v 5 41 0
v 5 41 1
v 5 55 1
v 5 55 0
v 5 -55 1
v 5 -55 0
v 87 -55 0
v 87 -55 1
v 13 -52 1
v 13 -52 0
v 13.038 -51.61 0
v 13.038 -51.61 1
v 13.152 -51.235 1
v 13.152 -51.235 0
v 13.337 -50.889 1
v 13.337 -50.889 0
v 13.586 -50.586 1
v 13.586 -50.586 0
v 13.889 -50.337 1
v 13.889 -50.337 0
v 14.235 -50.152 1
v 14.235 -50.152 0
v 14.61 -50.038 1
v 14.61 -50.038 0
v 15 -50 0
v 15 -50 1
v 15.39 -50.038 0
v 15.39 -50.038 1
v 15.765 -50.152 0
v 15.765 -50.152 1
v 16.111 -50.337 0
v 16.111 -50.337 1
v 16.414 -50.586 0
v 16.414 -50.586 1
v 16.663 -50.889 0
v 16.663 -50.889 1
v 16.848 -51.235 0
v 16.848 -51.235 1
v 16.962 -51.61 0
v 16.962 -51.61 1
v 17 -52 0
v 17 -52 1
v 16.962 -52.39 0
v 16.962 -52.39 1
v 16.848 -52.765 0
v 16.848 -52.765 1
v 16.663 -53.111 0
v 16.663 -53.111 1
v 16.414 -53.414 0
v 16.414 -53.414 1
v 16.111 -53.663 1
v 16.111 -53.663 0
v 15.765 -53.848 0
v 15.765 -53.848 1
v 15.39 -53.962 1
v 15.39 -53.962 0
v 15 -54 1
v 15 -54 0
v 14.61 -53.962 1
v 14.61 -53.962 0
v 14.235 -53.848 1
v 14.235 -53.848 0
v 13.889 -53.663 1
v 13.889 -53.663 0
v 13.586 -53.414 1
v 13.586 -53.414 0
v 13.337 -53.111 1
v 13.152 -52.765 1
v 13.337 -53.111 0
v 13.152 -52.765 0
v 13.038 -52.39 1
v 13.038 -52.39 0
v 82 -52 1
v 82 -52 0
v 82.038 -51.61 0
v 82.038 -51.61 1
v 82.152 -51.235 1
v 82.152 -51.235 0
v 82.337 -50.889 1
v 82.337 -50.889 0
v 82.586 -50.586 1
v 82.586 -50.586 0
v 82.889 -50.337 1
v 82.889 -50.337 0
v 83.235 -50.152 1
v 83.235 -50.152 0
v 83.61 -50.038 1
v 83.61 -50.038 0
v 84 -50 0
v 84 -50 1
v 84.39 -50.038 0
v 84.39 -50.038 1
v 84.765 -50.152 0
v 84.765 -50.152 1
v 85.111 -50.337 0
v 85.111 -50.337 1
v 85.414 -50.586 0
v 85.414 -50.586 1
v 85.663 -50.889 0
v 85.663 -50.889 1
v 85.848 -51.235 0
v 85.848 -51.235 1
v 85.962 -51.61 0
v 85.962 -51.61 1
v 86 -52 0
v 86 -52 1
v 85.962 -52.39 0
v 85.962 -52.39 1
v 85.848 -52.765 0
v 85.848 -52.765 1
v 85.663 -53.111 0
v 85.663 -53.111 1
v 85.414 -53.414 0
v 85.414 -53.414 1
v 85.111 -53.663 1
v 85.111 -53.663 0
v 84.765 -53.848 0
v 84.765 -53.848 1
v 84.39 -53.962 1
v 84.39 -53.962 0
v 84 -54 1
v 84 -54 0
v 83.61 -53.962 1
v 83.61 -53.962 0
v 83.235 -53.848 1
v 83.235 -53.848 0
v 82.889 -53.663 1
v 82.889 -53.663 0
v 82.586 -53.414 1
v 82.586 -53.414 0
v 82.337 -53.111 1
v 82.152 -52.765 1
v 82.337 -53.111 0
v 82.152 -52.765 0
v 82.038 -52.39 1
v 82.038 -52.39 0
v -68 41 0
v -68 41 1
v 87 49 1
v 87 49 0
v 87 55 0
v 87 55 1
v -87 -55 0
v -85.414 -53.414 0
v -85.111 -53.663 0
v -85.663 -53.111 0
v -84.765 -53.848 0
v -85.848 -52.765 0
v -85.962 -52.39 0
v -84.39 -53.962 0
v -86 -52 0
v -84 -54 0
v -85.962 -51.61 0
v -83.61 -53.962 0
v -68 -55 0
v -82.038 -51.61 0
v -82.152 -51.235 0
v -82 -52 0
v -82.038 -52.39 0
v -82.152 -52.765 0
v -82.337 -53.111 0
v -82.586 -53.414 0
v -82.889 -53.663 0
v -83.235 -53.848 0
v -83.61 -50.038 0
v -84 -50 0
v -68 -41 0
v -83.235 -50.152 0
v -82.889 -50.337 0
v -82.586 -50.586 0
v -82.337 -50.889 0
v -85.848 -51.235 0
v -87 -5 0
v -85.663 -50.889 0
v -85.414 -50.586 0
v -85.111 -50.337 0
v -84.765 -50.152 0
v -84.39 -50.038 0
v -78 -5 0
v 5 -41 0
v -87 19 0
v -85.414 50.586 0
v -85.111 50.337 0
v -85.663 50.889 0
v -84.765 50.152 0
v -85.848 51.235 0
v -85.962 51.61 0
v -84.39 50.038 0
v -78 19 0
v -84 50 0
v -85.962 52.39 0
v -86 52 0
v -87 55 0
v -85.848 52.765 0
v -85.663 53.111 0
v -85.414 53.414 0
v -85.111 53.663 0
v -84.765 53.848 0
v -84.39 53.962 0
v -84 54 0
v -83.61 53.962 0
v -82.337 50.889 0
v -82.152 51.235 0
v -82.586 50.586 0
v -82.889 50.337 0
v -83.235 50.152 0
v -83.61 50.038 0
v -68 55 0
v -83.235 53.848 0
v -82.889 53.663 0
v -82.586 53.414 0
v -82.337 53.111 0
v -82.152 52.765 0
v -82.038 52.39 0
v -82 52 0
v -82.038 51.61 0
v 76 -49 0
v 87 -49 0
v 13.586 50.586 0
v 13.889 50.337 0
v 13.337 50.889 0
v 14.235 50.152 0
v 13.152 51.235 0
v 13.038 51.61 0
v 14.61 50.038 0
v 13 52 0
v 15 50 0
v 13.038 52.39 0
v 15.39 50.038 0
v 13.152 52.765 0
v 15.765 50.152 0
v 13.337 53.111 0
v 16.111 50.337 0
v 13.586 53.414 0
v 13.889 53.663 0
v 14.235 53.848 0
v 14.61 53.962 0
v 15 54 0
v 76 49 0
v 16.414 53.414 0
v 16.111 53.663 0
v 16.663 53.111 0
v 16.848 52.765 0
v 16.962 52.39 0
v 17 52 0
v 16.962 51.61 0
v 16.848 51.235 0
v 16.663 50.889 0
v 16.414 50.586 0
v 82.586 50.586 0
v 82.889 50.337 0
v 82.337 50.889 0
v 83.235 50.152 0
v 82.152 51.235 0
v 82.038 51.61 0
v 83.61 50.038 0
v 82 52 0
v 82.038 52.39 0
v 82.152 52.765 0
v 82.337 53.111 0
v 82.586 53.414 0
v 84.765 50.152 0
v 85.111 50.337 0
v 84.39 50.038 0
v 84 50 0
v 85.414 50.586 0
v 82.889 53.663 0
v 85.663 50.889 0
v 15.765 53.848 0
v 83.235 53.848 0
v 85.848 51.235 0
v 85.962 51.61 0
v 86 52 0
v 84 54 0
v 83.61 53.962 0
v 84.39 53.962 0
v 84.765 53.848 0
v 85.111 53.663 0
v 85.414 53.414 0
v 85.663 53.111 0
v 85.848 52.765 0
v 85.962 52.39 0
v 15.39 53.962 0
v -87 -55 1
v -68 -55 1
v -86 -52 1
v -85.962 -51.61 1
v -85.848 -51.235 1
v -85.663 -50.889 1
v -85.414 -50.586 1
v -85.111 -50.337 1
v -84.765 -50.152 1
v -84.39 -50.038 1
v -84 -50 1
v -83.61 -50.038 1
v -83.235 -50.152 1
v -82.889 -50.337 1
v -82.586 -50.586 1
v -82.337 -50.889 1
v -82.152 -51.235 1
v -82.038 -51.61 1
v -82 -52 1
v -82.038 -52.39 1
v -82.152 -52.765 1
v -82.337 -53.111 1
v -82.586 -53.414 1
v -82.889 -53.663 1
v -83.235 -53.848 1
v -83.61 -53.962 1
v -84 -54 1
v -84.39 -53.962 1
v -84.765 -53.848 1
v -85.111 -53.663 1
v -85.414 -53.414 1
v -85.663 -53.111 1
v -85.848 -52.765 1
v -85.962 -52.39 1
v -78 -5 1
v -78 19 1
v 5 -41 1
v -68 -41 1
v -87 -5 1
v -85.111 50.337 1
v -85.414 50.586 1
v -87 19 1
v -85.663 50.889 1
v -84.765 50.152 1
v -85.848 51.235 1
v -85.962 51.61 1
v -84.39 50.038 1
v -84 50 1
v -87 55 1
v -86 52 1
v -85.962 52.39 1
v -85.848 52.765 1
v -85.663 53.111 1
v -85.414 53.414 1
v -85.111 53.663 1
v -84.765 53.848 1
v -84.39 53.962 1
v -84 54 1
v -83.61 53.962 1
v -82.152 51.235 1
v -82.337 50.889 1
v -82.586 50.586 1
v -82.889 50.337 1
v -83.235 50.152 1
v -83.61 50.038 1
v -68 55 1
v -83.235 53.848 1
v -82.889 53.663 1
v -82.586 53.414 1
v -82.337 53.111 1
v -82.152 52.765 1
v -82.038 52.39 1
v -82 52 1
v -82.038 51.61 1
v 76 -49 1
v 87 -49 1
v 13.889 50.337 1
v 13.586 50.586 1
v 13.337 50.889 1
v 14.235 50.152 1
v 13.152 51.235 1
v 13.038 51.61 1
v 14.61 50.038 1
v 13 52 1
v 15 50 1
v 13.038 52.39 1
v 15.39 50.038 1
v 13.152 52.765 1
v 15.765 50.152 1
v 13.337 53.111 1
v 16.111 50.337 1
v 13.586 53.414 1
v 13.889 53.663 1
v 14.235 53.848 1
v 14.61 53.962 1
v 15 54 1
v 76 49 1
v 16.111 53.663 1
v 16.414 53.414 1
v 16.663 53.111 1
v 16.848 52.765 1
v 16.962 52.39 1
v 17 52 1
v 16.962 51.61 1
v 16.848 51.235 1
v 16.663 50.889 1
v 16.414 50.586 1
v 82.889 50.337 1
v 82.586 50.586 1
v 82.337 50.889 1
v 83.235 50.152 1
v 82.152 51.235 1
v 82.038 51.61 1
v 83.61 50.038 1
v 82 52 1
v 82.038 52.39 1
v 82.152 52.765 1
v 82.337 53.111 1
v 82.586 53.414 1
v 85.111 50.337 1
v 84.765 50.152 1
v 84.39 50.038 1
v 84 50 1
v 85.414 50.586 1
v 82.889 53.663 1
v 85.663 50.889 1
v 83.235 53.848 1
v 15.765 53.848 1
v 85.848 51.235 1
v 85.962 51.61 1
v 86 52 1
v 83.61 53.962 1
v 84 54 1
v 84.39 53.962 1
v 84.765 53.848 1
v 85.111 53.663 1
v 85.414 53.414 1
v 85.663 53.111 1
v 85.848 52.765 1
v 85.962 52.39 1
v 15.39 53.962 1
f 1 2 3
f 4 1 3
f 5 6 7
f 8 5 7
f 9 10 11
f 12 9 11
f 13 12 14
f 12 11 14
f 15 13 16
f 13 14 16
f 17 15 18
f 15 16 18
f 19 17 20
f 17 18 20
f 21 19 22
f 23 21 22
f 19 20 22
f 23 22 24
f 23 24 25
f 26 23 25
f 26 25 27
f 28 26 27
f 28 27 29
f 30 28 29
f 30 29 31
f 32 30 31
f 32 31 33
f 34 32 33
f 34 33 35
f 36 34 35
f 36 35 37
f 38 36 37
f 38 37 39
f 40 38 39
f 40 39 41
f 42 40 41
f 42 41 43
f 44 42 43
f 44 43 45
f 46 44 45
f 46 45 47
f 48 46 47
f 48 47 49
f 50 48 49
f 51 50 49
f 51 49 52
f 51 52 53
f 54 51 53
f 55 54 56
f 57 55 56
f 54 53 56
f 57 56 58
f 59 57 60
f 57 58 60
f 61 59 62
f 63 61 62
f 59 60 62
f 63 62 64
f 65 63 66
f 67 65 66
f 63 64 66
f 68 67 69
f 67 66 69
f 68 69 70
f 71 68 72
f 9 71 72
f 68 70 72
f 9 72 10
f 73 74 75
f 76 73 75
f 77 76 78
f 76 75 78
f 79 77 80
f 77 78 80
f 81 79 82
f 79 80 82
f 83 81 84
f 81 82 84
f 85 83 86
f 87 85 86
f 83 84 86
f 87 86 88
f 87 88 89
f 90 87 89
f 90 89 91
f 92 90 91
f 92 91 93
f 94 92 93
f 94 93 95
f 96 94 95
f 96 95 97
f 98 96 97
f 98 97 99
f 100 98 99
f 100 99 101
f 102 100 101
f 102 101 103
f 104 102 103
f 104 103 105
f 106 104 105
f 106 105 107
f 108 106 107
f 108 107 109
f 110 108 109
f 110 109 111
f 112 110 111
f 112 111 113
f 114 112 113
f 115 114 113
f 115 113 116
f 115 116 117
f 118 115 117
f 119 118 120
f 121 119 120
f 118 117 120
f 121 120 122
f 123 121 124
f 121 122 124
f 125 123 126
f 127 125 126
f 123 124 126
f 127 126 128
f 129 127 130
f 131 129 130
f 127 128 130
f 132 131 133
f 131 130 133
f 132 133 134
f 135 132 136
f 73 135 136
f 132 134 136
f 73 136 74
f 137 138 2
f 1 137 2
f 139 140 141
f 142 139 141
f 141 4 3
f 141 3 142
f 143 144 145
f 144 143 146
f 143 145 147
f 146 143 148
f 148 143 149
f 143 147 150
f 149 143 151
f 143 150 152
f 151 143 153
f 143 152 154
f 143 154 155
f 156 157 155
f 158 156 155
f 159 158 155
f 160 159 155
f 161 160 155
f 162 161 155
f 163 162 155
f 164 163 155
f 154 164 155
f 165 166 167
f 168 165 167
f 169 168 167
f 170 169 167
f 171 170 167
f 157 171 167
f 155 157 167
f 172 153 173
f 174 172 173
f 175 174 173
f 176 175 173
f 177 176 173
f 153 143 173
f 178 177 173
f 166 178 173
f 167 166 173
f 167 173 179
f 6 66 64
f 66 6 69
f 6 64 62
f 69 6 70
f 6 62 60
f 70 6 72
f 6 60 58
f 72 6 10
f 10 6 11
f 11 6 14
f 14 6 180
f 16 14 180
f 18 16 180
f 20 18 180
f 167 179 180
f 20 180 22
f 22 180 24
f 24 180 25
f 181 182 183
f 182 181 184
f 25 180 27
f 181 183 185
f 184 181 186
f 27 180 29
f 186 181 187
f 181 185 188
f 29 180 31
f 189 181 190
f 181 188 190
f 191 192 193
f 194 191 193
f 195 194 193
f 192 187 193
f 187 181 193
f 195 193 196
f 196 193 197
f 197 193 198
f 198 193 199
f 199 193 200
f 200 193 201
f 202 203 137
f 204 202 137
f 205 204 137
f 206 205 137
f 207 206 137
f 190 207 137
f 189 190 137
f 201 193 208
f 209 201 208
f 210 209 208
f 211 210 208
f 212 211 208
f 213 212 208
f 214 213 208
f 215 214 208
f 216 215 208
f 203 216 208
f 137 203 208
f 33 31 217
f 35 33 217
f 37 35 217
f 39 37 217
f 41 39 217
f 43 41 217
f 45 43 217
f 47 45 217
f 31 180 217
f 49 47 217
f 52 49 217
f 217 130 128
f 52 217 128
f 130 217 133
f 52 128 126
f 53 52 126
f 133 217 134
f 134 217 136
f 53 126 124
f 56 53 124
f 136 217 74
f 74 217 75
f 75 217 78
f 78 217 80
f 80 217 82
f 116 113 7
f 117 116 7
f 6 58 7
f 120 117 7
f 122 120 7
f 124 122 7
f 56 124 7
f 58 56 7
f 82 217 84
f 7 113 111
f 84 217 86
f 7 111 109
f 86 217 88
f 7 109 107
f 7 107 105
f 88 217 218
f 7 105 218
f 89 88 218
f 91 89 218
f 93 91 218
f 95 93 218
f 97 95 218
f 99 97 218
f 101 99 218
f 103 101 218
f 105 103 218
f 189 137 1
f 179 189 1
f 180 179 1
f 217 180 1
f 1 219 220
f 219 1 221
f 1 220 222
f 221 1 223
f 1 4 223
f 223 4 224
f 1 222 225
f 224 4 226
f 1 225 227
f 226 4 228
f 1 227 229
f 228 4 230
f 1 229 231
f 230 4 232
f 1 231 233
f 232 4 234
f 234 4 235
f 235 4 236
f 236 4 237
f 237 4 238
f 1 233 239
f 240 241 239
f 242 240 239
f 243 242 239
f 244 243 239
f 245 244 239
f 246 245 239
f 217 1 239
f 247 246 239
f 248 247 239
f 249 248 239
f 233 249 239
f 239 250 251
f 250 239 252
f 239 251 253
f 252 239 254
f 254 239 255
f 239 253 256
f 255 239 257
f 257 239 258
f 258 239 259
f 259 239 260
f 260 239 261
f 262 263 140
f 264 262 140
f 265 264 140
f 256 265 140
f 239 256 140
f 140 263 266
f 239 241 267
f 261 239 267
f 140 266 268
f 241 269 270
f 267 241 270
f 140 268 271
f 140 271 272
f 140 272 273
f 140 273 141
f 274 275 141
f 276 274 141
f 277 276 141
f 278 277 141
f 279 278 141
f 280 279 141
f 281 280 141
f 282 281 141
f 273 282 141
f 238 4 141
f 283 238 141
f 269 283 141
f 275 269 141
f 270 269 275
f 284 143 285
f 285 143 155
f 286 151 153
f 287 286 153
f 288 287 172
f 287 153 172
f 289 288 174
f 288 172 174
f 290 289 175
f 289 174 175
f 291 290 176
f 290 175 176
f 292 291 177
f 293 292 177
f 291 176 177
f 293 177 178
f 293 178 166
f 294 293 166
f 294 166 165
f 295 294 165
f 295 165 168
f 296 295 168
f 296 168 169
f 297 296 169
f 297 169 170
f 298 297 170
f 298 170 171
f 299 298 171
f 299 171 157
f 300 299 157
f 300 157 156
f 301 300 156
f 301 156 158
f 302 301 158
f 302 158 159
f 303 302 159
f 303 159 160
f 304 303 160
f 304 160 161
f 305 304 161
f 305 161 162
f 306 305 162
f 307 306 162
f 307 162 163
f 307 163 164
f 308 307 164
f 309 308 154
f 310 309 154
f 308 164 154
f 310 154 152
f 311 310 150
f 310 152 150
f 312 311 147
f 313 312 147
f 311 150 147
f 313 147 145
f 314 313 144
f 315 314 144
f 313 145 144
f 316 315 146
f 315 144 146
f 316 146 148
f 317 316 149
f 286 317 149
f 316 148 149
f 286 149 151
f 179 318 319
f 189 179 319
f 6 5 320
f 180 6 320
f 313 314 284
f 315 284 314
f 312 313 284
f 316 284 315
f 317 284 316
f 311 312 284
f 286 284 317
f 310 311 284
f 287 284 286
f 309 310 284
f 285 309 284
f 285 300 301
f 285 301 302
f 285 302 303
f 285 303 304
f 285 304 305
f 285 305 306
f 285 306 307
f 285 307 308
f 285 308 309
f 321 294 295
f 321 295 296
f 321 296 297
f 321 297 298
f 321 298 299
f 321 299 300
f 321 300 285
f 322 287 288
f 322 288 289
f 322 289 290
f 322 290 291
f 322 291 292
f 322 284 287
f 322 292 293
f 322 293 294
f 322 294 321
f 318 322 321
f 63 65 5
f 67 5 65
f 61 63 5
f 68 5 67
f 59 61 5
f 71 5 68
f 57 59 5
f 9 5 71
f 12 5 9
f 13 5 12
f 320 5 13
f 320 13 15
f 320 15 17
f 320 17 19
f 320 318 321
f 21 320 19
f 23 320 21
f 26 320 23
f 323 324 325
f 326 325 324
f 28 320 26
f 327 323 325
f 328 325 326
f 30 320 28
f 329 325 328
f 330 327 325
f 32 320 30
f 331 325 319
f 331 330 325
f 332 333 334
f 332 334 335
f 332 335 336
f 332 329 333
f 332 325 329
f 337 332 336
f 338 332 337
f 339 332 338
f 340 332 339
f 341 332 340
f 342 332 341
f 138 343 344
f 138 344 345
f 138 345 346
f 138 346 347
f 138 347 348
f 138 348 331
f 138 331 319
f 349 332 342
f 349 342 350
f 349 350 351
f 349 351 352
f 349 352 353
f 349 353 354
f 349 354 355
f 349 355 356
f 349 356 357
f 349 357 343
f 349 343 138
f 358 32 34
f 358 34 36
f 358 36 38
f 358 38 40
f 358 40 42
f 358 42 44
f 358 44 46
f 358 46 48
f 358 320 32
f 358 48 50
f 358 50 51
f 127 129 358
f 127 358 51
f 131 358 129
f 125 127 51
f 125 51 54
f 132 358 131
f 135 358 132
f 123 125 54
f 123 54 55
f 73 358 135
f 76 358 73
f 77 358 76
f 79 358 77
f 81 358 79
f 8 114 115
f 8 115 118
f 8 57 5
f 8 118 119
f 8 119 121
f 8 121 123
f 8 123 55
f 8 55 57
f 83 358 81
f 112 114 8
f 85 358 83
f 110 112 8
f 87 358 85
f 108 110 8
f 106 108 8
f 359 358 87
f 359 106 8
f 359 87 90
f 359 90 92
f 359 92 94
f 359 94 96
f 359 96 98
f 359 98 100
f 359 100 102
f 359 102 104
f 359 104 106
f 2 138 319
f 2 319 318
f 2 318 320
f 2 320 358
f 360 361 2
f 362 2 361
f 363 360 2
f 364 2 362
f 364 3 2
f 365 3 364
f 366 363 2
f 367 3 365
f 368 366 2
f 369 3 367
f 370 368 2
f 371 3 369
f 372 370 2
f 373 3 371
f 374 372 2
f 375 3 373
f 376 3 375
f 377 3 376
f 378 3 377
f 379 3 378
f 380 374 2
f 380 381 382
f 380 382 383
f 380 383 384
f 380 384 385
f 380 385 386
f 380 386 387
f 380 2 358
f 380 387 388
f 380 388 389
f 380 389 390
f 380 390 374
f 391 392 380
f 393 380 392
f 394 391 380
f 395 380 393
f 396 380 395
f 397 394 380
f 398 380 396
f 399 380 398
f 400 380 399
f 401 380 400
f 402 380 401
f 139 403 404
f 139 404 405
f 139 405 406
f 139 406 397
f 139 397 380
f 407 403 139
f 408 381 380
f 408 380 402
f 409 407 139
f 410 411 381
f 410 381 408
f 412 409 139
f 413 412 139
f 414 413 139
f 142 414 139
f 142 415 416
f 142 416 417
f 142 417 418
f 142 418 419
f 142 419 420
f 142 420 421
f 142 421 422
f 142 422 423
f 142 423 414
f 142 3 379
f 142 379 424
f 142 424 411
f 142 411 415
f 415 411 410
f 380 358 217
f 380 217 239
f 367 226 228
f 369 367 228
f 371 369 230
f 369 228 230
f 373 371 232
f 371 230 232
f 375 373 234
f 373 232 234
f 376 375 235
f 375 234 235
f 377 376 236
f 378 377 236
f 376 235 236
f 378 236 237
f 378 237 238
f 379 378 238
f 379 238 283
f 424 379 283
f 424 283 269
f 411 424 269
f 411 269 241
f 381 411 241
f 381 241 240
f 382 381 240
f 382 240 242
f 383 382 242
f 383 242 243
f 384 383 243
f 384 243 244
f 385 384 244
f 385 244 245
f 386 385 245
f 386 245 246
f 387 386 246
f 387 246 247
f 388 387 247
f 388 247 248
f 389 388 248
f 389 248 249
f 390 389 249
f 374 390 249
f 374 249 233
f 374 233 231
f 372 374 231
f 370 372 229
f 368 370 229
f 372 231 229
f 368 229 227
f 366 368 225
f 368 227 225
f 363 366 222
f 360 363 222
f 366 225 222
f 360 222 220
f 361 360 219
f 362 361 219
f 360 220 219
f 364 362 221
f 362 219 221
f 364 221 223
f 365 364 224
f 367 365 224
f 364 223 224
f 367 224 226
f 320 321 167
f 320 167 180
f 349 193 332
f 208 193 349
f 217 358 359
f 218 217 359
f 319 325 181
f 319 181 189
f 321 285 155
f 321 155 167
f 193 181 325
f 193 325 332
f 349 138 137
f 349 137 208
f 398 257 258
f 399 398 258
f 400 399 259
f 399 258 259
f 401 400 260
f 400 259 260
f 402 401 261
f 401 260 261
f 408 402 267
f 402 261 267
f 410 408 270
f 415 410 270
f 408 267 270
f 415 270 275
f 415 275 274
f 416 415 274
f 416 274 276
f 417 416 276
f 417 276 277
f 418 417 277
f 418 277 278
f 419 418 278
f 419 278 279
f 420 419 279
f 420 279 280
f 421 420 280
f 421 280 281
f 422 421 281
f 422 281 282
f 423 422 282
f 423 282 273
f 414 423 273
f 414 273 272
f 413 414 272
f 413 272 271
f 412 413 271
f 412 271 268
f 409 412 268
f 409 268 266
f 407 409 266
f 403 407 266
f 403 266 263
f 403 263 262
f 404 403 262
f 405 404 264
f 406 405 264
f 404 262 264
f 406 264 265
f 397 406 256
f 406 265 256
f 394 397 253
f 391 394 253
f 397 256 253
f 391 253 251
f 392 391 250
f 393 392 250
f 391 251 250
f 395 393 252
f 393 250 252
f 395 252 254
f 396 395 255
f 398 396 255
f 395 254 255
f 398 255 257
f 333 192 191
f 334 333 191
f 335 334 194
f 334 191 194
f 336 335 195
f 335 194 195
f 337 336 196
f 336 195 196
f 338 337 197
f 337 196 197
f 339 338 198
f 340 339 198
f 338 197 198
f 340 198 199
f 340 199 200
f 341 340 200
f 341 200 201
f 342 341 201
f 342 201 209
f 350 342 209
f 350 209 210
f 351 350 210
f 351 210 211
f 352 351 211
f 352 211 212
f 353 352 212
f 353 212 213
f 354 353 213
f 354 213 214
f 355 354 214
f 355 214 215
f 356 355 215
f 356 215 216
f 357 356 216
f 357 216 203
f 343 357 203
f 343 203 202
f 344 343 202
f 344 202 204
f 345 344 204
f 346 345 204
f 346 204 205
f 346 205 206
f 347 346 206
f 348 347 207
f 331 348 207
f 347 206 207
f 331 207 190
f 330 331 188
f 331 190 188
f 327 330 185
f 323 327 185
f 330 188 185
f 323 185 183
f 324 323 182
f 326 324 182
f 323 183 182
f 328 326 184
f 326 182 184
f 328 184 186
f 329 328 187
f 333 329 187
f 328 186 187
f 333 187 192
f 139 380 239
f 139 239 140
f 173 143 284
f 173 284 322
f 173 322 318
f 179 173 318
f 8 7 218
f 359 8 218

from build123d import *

# Parameters (mm, degrees)
F1_W     = 174
F1_H     = 110
F2_DEPTH = 1
F3_W     = 73
F3_H     = 14
F3_W_2   = 9
F3_H_2   = 24
F3_W_3   = 11
F3_H_3   = 98
F4_DEPTH = 25
F6_D     = 4


with BuildPart() as f2:
    # F1 (on Top) → F2 (new body)
    with BuildSketch(Plane.XY):
        Rectangle(F1_W, F1_H)
    extrude(amount=F2_DEPTH)

    # F3 (on face) → F4 (cut)
    with BuildSketch(Plane.XY.offset(1)):
        with Locations((-31.5, 48)):
            Rectangle(F3_W, F3_H)
        with Locations((-31.5, -48)):
            Rectangle(F3_W, F3_H)
        with Locations((-82.5, 7)):
            Rectangle(F3_W_2, F3_H_2)
        with Locations((81.5, 0)):
            Rectangle(F3_W_3, F3_H_3)
    extrude(amount=-F4_DEPTH, mode=Mode.SUBTRACT)

    # F6 (through all)
    with Locations(Plane.XY.offset(1)):
        with Locations((-84, 52), (15, -52), (15, 52), (84, 52), (84, -52), (-84, -52)):
            Hole(F6_D / 2)


solid = f2.part
